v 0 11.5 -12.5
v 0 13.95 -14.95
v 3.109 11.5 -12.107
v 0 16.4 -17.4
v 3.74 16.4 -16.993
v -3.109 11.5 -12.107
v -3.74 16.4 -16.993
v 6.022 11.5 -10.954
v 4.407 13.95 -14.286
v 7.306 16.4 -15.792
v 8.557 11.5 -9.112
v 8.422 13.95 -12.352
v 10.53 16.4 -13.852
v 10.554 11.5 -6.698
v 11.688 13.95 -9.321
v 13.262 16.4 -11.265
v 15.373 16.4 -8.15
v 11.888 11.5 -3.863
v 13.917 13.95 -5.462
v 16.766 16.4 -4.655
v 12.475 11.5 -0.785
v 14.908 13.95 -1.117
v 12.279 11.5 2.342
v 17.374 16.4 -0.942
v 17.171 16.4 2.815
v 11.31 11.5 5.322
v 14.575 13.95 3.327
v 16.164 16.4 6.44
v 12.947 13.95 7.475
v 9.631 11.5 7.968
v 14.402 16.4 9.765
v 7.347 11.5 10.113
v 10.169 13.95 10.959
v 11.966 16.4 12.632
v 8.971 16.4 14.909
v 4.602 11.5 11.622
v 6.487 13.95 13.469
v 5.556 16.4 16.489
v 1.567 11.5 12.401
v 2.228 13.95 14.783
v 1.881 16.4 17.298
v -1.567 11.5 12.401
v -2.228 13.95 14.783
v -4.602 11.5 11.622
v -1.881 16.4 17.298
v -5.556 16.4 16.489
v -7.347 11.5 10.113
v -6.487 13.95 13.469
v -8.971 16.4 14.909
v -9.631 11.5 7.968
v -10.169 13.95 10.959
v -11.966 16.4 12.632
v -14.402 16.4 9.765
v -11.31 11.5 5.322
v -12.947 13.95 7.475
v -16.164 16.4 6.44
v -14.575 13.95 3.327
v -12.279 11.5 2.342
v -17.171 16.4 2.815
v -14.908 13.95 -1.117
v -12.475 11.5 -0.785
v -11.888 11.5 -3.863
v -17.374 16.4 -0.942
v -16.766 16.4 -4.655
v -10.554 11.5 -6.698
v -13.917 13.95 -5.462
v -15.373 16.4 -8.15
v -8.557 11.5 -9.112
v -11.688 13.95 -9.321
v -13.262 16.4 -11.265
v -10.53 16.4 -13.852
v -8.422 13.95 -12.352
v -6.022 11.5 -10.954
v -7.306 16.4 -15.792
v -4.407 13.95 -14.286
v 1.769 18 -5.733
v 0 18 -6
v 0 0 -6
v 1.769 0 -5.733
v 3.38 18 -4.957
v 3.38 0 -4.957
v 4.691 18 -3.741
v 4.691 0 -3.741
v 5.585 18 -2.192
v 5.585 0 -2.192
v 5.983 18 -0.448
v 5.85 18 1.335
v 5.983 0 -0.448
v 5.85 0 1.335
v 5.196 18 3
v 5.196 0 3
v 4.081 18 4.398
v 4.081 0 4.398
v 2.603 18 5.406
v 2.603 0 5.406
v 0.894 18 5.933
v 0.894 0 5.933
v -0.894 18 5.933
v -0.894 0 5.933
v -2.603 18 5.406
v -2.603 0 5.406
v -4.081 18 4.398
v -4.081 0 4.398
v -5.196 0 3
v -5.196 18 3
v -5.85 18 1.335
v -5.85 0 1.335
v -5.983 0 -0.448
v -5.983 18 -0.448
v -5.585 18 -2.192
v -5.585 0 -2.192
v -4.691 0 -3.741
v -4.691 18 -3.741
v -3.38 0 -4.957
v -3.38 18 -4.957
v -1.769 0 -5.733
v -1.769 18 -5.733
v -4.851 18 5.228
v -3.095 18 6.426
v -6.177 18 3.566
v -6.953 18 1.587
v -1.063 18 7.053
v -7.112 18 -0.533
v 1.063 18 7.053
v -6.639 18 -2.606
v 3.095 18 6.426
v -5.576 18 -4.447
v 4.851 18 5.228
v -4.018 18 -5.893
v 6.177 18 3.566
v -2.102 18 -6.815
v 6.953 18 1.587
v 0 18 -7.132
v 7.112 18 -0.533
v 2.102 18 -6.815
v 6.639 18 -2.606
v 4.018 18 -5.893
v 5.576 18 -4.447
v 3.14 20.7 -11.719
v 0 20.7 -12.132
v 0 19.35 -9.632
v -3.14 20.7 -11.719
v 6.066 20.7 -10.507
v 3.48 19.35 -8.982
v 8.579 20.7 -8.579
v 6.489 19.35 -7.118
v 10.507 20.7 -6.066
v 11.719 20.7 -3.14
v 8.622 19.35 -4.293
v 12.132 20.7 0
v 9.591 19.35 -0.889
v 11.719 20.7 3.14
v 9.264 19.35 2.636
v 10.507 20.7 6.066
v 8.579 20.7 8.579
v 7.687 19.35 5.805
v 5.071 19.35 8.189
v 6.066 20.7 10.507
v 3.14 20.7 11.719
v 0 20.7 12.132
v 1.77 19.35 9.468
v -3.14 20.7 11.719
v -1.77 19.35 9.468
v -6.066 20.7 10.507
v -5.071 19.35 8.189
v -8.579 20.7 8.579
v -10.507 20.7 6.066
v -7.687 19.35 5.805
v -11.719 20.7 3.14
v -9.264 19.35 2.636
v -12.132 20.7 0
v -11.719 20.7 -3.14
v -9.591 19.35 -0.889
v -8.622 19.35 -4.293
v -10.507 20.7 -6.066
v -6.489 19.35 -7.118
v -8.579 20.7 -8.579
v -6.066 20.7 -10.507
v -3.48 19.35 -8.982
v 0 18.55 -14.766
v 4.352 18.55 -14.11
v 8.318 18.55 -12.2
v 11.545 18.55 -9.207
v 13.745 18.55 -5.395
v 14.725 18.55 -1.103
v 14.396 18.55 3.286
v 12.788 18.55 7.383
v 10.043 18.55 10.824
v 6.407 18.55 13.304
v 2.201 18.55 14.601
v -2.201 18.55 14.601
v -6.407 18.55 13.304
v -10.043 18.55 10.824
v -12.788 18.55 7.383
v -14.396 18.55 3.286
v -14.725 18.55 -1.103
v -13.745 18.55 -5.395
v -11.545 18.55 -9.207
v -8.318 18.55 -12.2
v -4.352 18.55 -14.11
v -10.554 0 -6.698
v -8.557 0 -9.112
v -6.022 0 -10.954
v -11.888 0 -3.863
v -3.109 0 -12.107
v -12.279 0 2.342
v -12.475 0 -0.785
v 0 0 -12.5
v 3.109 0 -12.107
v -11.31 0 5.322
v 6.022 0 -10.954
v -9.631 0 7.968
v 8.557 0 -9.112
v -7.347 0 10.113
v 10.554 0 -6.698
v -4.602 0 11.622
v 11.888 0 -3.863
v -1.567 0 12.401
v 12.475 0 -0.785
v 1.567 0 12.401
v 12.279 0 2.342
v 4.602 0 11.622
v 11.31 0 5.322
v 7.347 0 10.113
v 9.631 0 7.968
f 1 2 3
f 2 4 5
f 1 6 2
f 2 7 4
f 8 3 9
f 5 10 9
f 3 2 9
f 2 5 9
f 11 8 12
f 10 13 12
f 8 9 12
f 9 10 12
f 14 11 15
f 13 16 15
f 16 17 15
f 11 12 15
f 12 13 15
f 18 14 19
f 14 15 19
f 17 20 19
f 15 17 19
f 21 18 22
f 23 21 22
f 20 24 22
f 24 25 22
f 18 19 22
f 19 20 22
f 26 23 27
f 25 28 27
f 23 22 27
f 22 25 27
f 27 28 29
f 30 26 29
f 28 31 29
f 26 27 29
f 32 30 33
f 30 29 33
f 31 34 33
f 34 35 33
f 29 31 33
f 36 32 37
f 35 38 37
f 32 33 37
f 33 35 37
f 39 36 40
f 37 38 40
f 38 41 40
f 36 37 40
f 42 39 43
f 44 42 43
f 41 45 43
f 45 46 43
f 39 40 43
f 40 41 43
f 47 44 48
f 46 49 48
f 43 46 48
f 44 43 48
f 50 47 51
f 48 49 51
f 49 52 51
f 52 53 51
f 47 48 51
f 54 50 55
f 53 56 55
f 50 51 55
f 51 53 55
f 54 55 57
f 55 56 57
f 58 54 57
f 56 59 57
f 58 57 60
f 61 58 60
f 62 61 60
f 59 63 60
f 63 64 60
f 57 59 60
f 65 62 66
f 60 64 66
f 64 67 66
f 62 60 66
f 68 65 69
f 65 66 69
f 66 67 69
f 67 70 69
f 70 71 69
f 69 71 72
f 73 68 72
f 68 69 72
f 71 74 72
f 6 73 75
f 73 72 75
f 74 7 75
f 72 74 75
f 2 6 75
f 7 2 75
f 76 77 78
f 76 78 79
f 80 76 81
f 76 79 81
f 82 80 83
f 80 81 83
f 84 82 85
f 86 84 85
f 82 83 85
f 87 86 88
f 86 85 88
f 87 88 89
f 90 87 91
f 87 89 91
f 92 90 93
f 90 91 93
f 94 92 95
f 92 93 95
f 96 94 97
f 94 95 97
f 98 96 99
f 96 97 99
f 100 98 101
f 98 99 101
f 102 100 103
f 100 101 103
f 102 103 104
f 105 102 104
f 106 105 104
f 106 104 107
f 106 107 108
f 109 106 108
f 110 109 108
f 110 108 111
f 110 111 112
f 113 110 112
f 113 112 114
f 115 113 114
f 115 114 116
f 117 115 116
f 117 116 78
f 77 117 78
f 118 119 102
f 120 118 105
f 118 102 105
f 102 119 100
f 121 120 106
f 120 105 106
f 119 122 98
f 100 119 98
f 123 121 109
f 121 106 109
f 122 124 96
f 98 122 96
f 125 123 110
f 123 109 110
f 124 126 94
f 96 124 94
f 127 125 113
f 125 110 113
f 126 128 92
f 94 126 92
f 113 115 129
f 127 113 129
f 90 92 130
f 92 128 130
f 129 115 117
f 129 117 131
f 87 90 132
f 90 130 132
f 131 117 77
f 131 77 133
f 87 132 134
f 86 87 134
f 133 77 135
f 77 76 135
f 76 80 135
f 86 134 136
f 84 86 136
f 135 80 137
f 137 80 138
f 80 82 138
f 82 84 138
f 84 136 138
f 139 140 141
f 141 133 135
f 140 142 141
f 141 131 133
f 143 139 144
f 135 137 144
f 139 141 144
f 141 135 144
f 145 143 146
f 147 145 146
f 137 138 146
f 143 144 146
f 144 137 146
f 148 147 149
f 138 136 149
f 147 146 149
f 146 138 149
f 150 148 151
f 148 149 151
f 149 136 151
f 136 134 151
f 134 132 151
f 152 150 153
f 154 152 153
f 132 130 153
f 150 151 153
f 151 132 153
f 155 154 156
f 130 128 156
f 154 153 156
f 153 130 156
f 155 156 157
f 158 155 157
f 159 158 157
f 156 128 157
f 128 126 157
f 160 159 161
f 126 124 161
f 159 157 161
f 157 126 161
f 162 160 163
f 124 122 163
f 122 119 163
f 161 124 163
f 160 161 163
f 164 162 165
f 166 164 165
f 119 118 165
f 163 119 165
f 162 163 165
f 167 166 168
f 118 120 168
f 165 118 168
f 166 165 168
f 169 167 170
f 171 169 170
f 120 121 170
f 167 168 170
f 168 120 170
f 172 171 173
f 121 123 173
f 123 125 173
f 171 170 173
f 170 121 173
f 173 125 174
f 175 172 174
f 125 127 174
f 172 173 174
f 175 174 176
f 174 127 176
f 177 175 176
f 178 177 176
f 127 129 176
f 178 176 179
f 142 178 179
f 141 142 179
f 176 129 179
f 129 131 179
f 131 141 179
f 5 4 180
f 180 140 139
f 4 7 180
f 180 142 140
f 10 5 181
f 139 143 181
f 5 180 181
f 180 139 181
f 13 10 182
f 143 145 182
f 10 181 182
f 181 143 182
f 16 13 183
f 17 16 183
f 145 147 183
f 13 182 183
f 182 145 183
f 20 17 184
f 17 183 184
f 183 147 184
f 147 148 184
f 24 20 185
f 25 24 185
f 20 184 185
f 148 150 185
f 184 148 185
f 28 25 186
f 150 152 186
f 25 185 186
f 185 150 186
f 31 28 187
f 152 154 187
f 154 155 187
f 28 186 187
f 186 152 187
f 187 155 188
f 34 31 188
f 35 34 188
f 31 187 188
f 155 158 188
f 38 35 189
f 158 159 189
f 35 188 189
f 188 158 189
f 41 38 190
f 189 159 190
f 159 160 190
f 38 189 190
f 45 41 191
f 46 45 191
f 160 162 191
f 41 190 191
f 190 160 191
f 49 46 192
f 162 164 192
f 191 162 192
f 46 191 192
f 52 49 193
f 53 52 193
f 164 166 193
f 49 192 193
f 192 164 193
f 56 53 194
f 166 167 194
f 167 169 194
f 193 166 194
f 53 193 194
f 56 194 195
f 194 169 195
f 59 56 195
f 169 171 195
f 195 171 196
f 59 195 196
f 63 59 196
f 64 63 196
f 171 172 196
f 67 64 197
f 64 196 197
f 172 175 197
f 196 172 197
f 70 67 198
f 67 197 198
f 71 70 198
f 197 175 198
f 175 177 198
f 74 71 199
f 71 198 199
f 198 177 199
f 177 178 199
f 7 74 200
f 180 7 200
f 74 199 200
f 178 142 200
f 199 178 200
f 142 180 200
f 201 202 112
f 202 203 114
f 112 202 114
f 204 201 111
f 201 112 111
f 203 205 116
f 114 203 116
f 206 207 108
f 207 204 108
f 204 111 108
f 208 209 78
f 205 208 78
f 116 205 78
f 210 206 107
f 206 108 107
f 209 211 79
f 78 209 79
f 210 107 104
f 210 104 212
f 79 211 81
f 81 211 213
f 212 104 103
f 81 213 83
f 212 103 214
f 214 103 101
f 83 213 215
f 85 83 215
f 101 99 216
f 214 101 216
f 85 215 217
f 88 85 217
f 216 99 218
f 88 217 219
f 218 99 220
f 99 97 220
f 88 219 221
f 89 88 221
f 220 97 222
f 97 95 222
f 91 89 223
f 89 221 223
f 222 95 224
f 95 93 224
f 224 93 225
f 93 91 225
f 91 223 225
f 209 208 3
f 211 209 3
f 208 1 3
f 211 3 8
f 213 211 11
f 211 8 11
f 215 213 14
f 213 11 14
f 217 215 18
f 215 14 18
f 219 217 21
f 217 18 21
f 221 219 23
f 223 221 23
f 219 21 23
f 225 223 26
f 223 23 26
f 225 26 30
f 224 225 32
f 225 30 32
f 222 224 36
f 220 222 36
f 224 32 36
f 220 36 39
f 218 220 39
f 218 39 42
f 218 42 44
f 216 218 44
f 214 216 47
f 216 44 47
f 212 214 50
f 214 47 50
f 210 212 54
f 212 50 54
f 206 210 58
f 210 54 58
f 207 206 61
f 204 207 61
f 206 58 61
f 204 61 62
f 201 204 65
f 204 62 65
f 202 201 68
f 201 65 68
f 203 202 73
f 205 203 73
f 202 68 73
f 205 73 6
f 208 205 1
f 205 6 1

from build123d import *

# Parameters (mm, degrees)
SKETCH2_R          = 6
CUT_EXTRUDE1_DEPTH = 33.156025874


with BuildPart() as part:
    # Sketch1 → Revolve1 (revolve)
    with BuildSketch(Plane.XY, mode=Mode.PRIVATE) as revolve1_sk:
        Polygon((17.4, 16.4), (12.132173, 20.7), (7.132173, 18), (5, 18), (5, 0), (12.5, 0), (12.5, 11.5), align=None)
    revolve(revolve1_sk.sketch.rotate(Axis((0, 20.7, 0), (0, -1, 0)), 270), axis=Axis((0, 20.7, 0), (0, -1, 0)))

    # Sketch2 → Cut-Extrude1 (cut, through all)
    with BuildSketch(Plane.XZ):
        with Locations(Location((0, 0, 0), (0, 0, 270))):
            Circle(SKETCH2_R)
    extrude(amount=-CUT_EXTRUDE1_DEPTH, mode=Mode.SUBTRACT)


solid = part.part
